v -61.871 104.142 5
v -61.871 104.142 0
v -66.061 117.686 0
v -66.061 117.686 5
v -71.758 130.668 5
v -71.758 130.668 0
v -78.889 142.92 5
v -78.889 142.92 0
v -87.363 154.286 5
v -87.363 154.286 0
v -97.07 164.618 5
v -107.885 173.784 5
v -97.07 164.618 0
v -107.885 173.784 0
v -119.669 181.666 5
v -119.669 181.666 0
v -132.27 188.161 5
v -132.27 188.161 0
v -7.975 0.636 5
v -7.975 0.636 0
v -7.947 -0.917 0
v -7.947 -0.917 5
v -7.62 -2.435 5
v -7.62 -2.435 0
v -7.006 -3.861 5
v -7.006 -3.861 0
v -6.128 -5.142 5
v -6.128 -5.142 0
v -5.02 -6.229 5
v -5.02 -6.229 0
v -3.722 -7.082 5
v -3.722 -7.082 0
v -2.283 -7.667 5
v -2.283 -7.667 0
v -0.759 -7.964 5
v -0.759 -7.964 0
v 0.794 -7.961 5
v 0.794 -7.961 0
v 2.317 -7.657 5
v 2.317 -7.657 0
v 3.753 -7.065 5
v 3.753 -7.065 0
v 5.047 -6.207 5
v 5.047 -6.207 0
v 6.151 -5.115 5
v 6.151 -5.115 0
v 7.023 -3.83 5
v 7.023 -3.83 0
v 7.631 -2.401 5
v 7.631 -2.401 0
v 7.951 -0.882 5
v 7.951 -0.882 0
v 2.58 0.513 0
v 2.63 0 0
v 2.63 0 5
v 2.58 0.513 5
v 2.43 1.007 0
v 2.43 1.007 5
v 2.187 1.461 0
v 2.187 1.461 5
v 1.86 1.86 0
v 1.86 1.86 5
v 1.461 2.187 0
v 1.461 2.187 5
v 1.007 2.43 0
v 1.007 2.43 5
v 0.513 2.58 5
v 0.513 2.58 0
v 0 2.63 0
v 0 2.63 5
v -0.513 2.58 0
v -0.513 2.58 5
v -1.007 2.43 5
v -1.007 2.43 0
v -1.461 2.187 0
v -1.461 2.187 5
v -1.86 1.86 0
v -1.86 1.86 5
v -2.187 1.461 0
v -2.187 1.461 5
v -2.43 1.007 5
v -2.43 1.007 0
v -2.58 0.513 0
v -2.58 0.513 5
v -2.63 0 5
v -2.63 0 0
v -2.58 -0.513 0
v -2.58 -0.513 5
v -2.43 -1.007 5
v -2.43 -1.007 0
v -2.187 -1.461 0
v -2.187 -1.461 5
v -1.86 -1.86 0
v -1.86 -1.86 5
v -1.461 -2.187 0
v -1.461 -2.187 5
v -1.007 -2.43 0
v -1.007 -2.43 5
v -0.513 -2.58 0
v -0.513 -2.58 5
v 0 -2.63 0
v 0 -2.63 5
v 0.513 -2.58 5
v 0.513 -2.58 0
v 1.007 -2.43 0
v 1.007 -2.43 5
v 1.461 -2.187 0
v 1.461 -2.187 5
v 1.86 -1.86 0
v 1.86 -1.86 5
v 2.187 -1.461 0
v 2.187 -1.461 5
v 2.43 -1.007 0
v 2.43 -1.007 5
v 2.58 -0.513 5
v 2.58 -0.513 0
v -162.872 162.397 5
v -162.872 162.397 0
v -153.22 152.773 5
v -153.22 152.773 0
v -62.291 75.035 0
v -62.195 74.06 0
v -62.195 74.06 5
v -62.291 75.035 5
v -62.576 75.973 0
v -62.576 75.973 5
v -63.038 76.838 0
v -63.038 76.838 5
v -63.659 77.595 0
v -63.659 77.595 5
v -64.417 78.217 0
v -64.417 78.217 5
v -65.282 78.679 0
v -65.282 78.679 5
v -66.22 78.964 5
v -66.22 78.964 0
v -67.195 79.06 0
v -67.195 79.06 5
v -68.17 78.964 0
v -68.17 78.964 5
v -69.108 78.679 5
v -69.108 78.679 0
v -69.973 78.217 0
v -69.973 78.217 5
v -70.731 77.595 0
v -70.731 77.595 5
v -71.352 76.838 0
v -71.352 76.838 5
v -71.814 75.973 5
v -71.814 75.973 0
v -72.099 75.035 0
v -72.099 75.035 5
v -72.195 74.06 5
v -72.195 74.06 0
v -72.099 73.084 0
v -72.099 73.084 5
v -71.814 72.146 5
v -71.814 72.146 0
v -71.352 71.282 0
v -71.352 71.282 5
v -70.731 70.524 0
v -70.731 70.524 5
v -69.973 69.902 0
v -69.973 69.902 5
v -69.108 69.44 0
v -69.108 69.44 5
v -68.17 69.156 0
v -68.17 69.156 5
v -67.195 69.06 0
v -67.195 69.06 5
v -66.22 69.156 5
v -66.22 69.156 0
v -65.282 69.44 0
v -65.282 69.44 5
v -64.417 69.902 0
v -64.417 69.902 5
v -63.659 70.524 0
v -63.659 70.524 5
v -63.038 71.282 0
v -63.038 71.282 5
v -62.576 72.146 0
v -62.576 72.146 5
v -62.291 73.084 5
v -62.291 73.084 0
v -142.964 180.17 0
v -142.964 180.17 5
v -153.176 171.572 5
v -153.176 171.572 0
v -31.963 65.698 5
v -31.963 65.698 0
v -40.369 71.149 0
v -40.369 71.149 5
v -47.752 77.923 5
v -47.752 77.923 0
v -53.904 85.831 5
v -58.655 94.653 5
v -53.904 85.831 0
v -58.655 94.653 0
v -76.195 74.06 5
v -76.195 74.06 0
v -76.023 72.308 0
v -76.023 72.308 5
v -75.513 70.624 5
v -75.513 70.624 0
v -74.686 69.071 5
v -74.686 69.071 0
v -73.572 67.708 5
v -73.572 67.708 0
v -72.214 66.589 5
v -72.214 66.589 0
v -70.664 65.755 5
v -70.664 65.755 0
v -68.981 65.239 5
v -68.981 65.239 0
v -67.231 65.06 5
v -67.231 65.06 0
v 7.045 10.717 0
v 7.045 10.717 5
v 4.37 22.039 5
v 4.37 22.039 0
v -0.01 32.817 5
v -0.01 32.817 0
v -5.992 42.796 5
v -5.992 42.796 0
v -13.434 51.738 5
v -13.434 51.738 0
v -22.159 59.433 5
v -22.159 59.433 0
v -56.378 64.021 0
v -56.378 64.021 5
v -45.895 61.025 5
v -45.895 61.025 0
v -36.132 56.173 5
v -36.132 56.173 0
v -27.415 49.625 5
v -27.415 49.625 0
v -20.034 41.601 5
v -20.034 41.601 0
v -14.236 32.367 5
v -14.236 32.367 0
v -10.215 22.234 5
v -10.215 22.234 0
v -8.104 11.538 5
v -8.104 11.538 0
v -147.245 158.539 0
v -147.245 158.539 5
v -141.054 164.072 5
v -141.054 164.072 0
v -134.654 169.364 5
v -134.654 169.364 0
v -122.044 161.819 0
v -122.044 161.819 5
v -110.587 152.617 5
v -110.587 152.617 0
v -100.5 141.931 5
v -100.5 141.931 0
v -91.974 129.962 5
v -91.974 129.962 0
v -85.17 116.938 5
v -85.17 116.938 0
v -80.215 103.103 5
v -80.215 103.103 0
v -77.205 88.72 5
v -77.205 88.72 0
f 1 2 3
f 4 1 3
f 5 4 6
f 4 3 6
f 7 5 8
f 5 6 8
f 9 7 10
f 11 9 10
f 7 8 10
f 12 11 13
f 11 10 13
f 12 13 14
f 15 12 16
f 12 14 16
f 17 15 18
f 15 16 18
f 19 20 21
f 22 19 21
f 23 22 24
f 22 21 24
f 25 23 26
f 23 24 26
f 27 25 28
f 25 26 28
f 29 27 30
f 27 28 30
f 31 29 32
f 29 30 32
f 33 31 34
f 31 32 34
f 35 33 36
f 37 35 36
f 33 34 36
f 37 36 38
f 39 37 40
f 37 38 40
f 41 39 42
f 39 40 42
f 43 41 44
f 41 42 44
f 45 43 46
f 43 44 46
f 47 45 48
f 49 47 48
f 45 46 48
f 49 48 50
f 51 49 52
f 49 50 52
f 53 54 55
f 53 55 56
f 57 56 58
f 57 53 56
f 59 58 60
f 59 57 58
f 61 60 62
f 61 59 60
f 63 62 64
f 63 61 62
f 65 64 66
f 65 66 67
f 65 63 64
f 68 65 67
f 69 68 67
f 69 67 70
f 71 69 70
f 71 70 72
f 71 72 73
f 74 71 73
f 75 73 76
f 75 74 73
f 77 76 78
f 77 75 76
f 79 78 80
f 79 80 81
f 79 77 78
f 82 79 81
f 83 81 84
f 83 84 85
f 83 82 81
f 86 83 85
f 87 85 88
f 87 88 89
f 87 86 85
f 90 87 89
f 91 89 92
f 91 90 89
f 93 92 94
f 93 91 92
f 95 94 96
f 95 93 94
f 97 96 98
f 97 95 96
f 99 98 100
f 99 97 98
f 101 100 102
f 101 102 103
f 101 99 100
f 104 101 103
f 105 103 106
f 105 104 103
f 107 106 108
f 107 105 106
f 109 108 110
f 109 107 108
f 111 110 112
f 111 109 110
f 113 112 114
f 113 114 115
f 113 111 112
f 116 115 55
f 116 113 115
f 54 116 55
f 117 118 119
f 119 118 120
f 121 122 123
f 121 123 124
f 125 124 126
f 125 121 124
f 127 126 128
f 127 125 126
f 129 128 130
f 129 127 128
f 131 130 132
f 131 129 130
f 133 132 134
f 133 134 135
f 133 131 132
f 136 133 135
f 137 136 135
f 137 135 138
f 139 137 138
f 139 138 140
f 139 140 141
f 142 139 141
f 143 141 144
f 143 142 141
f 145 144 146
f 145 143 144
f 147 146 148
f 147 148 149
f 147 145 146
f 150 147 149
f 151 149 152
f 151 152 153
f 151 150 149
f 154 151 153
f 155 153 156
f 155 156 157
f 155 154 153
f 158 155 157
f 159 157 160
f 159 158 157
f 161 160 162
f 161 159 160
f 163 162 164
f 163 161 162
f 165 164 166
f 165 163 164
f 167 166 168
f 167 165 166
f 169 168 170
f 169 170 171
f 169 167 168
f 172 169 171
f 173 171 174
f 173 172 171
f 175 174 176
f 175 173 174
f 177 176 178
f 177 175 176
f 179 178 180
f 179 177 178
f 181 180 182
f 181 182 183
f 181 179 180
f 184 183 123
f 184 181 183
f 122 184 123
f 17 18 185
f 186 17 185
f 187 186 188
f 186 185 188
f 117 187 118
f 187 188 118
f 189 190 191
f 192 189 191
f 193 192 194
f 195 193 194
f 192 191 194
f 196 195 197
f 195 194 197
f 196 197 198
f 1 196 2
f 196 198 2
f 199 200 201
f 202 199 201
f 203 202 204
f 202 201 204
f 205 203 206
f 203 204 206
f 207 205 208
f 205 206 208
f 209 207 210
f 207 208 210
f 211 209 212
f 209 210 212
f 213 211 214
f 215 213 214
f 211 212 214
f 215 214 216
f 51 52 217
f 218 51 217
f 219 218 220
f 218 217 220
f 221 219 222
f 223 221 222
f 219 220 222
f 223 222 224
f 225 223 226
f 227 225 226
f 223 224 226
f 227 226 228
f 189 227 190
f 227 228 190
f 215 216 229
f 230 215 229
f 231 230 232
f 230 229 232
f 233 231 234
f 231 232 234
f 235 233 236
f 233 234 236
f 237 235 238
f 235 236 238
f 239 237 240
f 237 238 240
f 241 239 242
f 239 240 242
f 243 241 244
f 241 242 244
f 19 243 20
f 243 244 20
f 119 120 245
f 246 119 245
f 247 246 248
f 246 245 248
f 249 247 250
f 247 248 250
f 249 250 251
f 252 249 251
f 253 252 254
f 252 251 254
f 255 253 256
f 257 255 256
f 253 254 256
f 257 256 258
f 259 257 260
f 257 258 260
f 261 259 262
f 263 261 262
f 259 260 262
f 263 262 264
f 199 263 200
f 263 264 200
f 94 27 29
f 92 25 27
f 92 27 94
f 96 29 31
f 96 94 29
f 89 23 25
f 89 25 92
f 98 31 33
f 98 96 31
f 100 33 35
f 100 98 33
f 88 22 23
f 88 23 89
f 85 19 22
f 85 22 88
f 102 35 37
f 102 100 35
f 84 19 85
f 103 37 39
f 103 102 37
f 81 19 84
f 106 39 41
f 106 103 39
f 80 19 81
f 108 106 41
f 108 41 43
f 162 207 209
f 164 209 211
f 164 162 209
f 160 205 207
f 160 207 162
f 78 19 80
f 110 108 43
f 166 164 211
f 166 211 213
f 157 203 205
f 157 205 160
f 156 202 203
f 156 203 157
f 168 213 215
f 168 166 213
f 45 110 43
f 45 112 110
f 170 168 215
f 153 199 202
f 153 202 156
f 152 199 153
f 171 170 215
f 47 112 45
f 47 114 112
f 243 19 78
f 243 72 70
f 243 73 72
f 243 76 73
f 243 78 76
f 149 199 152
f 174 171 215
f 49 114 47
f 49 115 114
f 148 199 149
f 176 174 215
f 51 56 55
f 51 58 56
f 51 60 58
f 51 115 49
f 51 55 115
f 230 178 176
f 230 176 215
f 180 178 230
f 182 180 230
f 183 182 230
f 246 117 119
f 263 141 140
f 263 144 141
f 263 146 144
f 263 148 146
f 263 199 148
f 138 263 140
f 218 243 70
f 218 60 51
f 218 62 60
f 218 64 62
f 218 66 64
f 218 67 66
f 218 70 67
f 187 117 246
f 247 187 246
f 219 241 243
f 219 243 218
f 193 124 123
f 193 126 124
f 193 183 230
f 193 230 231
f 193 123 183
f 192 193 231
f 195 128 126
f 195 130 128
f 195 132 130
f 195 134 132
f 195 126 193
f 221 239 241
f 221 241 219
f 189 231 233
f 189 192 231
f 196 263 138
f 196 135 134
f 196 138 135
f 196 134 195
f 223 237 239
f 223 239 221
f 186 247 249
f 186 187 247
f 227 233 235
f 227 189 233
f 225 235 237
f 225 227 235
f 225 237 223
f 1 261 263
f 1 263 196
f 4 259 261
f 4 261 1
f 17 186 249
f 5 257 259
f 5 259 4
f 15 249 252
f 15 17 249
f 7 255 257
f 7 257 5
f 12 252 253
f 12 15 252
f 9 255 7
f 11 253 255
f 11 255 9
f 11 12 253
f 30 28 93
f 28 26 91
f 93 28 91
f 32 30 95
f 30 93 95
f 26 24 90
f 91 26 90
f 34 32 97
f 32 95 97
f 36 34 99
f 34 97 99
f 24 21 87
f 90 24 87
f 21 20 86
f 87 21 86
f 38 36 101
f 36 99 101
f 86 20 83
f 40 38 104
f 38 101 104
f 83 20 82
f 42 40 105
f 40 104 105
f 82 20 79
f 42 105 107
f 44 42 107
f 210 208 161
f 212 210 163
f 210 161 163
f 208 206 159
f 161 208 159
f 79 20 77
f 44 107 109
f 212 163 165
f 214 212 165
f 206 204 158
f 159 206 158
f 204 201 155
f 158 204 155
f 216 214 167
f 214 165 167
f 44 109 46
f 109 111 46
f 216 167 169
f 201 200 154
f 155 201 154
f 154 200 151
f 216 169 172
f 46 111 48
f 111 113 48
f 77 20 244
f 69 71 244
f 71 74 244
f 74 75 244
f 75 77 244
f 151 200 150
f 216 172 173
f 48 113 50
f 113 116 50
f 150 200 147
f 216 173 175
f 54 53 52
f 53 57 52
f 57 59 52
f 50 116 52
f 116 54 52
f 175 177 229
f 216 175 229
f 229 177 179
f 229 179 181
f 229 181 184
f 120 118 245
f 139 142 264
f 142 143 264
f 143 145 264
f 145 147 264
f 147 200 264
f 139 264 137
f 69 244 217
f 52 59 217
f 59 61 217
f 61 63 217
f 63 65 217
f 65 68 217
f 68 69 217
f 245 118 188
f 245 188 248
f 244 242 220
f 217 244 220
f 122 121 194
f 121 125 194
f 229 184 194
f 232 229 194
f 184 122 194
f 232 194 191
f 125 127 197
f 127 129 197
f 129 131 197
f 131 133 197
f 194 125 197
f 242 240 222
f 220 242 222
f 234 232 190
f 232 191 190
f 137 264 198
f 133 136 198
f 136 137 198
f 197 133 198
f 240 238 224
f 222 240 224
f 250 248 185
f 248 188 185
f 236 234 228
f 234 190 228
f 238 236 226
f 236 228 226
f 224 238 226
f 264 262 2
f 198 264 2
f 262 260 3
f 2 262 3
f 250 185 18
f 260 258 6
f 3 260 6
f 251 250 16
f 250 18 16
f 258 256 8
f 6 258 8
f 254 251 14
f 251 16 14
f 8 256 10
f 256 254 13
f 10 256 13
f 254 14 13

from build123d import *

# Parameters (mm, degrees)
SKETCH1_R           = 5
SKETCH1_R_2         = 2.630242902
BOSS_EXTRUDE1_DEPTH = 5


with BuildPart() as part:
    # Sketch1 → Boss-Extrude1 (new body)
    with BuildSketch(Plane.XY):
        with BuildLine():
            ThreePointArc((-132.270242639, 188.16105578), (-148.132436646, 175.945392703), (-162.872207874, 162.396563703))
            Line((-162.872207874, 162.396563703), (-153.220049521, 152.772593049))
            ThreePointArc((-153.220049521, 152.772593049), (-144.175949012, 161.335502877), (-134.654137313, 169.363845217))
            ThreePointArc((-134.654137313, 169.363845217), (-91.974174204, 129.962156064), (-76.195, 74.059651464))
            ThreePointArc((-76.195, 74.059651464), (-73.571522122, 67.708276367), (-67.230563194, 65.059721728))
            ThreePointArc((-67.230563194, 65.059721728), (-23.540861603, 45.781560748), (-7.974687844, 0.635888194))
            ThreePointArc((-7.974687844, 0.635888194), (-0.758972679, -7.963916152), (7.951244839, -0.881876127))
            ThreePointArc((7.951244839, -0.881876127), (-2.808500316, 37.921764044), (-31.962523765, 65.698328321))
            ThreePointArc((-31.962523765, 65.698328321), (-50.993465666, 81.748695293), (-61.871355452, 104.142054652))
            ThreePointArc((-61.871355452, 104.142054652), (-87.362753882, 154.285853019), (-132.270242639, 188.16105578))
        make_face()
        with Locations((-67.195, 74.059651464)):
            Circle(SKETCH1_R, mode=Mode.SUBTRACT)
        Circle(SKETCH1_R_2, mode=Mode.SUBTRACT)
    extrude(amount=BOSS_EXTRUDE1_DEPTH)


solid = part.part
